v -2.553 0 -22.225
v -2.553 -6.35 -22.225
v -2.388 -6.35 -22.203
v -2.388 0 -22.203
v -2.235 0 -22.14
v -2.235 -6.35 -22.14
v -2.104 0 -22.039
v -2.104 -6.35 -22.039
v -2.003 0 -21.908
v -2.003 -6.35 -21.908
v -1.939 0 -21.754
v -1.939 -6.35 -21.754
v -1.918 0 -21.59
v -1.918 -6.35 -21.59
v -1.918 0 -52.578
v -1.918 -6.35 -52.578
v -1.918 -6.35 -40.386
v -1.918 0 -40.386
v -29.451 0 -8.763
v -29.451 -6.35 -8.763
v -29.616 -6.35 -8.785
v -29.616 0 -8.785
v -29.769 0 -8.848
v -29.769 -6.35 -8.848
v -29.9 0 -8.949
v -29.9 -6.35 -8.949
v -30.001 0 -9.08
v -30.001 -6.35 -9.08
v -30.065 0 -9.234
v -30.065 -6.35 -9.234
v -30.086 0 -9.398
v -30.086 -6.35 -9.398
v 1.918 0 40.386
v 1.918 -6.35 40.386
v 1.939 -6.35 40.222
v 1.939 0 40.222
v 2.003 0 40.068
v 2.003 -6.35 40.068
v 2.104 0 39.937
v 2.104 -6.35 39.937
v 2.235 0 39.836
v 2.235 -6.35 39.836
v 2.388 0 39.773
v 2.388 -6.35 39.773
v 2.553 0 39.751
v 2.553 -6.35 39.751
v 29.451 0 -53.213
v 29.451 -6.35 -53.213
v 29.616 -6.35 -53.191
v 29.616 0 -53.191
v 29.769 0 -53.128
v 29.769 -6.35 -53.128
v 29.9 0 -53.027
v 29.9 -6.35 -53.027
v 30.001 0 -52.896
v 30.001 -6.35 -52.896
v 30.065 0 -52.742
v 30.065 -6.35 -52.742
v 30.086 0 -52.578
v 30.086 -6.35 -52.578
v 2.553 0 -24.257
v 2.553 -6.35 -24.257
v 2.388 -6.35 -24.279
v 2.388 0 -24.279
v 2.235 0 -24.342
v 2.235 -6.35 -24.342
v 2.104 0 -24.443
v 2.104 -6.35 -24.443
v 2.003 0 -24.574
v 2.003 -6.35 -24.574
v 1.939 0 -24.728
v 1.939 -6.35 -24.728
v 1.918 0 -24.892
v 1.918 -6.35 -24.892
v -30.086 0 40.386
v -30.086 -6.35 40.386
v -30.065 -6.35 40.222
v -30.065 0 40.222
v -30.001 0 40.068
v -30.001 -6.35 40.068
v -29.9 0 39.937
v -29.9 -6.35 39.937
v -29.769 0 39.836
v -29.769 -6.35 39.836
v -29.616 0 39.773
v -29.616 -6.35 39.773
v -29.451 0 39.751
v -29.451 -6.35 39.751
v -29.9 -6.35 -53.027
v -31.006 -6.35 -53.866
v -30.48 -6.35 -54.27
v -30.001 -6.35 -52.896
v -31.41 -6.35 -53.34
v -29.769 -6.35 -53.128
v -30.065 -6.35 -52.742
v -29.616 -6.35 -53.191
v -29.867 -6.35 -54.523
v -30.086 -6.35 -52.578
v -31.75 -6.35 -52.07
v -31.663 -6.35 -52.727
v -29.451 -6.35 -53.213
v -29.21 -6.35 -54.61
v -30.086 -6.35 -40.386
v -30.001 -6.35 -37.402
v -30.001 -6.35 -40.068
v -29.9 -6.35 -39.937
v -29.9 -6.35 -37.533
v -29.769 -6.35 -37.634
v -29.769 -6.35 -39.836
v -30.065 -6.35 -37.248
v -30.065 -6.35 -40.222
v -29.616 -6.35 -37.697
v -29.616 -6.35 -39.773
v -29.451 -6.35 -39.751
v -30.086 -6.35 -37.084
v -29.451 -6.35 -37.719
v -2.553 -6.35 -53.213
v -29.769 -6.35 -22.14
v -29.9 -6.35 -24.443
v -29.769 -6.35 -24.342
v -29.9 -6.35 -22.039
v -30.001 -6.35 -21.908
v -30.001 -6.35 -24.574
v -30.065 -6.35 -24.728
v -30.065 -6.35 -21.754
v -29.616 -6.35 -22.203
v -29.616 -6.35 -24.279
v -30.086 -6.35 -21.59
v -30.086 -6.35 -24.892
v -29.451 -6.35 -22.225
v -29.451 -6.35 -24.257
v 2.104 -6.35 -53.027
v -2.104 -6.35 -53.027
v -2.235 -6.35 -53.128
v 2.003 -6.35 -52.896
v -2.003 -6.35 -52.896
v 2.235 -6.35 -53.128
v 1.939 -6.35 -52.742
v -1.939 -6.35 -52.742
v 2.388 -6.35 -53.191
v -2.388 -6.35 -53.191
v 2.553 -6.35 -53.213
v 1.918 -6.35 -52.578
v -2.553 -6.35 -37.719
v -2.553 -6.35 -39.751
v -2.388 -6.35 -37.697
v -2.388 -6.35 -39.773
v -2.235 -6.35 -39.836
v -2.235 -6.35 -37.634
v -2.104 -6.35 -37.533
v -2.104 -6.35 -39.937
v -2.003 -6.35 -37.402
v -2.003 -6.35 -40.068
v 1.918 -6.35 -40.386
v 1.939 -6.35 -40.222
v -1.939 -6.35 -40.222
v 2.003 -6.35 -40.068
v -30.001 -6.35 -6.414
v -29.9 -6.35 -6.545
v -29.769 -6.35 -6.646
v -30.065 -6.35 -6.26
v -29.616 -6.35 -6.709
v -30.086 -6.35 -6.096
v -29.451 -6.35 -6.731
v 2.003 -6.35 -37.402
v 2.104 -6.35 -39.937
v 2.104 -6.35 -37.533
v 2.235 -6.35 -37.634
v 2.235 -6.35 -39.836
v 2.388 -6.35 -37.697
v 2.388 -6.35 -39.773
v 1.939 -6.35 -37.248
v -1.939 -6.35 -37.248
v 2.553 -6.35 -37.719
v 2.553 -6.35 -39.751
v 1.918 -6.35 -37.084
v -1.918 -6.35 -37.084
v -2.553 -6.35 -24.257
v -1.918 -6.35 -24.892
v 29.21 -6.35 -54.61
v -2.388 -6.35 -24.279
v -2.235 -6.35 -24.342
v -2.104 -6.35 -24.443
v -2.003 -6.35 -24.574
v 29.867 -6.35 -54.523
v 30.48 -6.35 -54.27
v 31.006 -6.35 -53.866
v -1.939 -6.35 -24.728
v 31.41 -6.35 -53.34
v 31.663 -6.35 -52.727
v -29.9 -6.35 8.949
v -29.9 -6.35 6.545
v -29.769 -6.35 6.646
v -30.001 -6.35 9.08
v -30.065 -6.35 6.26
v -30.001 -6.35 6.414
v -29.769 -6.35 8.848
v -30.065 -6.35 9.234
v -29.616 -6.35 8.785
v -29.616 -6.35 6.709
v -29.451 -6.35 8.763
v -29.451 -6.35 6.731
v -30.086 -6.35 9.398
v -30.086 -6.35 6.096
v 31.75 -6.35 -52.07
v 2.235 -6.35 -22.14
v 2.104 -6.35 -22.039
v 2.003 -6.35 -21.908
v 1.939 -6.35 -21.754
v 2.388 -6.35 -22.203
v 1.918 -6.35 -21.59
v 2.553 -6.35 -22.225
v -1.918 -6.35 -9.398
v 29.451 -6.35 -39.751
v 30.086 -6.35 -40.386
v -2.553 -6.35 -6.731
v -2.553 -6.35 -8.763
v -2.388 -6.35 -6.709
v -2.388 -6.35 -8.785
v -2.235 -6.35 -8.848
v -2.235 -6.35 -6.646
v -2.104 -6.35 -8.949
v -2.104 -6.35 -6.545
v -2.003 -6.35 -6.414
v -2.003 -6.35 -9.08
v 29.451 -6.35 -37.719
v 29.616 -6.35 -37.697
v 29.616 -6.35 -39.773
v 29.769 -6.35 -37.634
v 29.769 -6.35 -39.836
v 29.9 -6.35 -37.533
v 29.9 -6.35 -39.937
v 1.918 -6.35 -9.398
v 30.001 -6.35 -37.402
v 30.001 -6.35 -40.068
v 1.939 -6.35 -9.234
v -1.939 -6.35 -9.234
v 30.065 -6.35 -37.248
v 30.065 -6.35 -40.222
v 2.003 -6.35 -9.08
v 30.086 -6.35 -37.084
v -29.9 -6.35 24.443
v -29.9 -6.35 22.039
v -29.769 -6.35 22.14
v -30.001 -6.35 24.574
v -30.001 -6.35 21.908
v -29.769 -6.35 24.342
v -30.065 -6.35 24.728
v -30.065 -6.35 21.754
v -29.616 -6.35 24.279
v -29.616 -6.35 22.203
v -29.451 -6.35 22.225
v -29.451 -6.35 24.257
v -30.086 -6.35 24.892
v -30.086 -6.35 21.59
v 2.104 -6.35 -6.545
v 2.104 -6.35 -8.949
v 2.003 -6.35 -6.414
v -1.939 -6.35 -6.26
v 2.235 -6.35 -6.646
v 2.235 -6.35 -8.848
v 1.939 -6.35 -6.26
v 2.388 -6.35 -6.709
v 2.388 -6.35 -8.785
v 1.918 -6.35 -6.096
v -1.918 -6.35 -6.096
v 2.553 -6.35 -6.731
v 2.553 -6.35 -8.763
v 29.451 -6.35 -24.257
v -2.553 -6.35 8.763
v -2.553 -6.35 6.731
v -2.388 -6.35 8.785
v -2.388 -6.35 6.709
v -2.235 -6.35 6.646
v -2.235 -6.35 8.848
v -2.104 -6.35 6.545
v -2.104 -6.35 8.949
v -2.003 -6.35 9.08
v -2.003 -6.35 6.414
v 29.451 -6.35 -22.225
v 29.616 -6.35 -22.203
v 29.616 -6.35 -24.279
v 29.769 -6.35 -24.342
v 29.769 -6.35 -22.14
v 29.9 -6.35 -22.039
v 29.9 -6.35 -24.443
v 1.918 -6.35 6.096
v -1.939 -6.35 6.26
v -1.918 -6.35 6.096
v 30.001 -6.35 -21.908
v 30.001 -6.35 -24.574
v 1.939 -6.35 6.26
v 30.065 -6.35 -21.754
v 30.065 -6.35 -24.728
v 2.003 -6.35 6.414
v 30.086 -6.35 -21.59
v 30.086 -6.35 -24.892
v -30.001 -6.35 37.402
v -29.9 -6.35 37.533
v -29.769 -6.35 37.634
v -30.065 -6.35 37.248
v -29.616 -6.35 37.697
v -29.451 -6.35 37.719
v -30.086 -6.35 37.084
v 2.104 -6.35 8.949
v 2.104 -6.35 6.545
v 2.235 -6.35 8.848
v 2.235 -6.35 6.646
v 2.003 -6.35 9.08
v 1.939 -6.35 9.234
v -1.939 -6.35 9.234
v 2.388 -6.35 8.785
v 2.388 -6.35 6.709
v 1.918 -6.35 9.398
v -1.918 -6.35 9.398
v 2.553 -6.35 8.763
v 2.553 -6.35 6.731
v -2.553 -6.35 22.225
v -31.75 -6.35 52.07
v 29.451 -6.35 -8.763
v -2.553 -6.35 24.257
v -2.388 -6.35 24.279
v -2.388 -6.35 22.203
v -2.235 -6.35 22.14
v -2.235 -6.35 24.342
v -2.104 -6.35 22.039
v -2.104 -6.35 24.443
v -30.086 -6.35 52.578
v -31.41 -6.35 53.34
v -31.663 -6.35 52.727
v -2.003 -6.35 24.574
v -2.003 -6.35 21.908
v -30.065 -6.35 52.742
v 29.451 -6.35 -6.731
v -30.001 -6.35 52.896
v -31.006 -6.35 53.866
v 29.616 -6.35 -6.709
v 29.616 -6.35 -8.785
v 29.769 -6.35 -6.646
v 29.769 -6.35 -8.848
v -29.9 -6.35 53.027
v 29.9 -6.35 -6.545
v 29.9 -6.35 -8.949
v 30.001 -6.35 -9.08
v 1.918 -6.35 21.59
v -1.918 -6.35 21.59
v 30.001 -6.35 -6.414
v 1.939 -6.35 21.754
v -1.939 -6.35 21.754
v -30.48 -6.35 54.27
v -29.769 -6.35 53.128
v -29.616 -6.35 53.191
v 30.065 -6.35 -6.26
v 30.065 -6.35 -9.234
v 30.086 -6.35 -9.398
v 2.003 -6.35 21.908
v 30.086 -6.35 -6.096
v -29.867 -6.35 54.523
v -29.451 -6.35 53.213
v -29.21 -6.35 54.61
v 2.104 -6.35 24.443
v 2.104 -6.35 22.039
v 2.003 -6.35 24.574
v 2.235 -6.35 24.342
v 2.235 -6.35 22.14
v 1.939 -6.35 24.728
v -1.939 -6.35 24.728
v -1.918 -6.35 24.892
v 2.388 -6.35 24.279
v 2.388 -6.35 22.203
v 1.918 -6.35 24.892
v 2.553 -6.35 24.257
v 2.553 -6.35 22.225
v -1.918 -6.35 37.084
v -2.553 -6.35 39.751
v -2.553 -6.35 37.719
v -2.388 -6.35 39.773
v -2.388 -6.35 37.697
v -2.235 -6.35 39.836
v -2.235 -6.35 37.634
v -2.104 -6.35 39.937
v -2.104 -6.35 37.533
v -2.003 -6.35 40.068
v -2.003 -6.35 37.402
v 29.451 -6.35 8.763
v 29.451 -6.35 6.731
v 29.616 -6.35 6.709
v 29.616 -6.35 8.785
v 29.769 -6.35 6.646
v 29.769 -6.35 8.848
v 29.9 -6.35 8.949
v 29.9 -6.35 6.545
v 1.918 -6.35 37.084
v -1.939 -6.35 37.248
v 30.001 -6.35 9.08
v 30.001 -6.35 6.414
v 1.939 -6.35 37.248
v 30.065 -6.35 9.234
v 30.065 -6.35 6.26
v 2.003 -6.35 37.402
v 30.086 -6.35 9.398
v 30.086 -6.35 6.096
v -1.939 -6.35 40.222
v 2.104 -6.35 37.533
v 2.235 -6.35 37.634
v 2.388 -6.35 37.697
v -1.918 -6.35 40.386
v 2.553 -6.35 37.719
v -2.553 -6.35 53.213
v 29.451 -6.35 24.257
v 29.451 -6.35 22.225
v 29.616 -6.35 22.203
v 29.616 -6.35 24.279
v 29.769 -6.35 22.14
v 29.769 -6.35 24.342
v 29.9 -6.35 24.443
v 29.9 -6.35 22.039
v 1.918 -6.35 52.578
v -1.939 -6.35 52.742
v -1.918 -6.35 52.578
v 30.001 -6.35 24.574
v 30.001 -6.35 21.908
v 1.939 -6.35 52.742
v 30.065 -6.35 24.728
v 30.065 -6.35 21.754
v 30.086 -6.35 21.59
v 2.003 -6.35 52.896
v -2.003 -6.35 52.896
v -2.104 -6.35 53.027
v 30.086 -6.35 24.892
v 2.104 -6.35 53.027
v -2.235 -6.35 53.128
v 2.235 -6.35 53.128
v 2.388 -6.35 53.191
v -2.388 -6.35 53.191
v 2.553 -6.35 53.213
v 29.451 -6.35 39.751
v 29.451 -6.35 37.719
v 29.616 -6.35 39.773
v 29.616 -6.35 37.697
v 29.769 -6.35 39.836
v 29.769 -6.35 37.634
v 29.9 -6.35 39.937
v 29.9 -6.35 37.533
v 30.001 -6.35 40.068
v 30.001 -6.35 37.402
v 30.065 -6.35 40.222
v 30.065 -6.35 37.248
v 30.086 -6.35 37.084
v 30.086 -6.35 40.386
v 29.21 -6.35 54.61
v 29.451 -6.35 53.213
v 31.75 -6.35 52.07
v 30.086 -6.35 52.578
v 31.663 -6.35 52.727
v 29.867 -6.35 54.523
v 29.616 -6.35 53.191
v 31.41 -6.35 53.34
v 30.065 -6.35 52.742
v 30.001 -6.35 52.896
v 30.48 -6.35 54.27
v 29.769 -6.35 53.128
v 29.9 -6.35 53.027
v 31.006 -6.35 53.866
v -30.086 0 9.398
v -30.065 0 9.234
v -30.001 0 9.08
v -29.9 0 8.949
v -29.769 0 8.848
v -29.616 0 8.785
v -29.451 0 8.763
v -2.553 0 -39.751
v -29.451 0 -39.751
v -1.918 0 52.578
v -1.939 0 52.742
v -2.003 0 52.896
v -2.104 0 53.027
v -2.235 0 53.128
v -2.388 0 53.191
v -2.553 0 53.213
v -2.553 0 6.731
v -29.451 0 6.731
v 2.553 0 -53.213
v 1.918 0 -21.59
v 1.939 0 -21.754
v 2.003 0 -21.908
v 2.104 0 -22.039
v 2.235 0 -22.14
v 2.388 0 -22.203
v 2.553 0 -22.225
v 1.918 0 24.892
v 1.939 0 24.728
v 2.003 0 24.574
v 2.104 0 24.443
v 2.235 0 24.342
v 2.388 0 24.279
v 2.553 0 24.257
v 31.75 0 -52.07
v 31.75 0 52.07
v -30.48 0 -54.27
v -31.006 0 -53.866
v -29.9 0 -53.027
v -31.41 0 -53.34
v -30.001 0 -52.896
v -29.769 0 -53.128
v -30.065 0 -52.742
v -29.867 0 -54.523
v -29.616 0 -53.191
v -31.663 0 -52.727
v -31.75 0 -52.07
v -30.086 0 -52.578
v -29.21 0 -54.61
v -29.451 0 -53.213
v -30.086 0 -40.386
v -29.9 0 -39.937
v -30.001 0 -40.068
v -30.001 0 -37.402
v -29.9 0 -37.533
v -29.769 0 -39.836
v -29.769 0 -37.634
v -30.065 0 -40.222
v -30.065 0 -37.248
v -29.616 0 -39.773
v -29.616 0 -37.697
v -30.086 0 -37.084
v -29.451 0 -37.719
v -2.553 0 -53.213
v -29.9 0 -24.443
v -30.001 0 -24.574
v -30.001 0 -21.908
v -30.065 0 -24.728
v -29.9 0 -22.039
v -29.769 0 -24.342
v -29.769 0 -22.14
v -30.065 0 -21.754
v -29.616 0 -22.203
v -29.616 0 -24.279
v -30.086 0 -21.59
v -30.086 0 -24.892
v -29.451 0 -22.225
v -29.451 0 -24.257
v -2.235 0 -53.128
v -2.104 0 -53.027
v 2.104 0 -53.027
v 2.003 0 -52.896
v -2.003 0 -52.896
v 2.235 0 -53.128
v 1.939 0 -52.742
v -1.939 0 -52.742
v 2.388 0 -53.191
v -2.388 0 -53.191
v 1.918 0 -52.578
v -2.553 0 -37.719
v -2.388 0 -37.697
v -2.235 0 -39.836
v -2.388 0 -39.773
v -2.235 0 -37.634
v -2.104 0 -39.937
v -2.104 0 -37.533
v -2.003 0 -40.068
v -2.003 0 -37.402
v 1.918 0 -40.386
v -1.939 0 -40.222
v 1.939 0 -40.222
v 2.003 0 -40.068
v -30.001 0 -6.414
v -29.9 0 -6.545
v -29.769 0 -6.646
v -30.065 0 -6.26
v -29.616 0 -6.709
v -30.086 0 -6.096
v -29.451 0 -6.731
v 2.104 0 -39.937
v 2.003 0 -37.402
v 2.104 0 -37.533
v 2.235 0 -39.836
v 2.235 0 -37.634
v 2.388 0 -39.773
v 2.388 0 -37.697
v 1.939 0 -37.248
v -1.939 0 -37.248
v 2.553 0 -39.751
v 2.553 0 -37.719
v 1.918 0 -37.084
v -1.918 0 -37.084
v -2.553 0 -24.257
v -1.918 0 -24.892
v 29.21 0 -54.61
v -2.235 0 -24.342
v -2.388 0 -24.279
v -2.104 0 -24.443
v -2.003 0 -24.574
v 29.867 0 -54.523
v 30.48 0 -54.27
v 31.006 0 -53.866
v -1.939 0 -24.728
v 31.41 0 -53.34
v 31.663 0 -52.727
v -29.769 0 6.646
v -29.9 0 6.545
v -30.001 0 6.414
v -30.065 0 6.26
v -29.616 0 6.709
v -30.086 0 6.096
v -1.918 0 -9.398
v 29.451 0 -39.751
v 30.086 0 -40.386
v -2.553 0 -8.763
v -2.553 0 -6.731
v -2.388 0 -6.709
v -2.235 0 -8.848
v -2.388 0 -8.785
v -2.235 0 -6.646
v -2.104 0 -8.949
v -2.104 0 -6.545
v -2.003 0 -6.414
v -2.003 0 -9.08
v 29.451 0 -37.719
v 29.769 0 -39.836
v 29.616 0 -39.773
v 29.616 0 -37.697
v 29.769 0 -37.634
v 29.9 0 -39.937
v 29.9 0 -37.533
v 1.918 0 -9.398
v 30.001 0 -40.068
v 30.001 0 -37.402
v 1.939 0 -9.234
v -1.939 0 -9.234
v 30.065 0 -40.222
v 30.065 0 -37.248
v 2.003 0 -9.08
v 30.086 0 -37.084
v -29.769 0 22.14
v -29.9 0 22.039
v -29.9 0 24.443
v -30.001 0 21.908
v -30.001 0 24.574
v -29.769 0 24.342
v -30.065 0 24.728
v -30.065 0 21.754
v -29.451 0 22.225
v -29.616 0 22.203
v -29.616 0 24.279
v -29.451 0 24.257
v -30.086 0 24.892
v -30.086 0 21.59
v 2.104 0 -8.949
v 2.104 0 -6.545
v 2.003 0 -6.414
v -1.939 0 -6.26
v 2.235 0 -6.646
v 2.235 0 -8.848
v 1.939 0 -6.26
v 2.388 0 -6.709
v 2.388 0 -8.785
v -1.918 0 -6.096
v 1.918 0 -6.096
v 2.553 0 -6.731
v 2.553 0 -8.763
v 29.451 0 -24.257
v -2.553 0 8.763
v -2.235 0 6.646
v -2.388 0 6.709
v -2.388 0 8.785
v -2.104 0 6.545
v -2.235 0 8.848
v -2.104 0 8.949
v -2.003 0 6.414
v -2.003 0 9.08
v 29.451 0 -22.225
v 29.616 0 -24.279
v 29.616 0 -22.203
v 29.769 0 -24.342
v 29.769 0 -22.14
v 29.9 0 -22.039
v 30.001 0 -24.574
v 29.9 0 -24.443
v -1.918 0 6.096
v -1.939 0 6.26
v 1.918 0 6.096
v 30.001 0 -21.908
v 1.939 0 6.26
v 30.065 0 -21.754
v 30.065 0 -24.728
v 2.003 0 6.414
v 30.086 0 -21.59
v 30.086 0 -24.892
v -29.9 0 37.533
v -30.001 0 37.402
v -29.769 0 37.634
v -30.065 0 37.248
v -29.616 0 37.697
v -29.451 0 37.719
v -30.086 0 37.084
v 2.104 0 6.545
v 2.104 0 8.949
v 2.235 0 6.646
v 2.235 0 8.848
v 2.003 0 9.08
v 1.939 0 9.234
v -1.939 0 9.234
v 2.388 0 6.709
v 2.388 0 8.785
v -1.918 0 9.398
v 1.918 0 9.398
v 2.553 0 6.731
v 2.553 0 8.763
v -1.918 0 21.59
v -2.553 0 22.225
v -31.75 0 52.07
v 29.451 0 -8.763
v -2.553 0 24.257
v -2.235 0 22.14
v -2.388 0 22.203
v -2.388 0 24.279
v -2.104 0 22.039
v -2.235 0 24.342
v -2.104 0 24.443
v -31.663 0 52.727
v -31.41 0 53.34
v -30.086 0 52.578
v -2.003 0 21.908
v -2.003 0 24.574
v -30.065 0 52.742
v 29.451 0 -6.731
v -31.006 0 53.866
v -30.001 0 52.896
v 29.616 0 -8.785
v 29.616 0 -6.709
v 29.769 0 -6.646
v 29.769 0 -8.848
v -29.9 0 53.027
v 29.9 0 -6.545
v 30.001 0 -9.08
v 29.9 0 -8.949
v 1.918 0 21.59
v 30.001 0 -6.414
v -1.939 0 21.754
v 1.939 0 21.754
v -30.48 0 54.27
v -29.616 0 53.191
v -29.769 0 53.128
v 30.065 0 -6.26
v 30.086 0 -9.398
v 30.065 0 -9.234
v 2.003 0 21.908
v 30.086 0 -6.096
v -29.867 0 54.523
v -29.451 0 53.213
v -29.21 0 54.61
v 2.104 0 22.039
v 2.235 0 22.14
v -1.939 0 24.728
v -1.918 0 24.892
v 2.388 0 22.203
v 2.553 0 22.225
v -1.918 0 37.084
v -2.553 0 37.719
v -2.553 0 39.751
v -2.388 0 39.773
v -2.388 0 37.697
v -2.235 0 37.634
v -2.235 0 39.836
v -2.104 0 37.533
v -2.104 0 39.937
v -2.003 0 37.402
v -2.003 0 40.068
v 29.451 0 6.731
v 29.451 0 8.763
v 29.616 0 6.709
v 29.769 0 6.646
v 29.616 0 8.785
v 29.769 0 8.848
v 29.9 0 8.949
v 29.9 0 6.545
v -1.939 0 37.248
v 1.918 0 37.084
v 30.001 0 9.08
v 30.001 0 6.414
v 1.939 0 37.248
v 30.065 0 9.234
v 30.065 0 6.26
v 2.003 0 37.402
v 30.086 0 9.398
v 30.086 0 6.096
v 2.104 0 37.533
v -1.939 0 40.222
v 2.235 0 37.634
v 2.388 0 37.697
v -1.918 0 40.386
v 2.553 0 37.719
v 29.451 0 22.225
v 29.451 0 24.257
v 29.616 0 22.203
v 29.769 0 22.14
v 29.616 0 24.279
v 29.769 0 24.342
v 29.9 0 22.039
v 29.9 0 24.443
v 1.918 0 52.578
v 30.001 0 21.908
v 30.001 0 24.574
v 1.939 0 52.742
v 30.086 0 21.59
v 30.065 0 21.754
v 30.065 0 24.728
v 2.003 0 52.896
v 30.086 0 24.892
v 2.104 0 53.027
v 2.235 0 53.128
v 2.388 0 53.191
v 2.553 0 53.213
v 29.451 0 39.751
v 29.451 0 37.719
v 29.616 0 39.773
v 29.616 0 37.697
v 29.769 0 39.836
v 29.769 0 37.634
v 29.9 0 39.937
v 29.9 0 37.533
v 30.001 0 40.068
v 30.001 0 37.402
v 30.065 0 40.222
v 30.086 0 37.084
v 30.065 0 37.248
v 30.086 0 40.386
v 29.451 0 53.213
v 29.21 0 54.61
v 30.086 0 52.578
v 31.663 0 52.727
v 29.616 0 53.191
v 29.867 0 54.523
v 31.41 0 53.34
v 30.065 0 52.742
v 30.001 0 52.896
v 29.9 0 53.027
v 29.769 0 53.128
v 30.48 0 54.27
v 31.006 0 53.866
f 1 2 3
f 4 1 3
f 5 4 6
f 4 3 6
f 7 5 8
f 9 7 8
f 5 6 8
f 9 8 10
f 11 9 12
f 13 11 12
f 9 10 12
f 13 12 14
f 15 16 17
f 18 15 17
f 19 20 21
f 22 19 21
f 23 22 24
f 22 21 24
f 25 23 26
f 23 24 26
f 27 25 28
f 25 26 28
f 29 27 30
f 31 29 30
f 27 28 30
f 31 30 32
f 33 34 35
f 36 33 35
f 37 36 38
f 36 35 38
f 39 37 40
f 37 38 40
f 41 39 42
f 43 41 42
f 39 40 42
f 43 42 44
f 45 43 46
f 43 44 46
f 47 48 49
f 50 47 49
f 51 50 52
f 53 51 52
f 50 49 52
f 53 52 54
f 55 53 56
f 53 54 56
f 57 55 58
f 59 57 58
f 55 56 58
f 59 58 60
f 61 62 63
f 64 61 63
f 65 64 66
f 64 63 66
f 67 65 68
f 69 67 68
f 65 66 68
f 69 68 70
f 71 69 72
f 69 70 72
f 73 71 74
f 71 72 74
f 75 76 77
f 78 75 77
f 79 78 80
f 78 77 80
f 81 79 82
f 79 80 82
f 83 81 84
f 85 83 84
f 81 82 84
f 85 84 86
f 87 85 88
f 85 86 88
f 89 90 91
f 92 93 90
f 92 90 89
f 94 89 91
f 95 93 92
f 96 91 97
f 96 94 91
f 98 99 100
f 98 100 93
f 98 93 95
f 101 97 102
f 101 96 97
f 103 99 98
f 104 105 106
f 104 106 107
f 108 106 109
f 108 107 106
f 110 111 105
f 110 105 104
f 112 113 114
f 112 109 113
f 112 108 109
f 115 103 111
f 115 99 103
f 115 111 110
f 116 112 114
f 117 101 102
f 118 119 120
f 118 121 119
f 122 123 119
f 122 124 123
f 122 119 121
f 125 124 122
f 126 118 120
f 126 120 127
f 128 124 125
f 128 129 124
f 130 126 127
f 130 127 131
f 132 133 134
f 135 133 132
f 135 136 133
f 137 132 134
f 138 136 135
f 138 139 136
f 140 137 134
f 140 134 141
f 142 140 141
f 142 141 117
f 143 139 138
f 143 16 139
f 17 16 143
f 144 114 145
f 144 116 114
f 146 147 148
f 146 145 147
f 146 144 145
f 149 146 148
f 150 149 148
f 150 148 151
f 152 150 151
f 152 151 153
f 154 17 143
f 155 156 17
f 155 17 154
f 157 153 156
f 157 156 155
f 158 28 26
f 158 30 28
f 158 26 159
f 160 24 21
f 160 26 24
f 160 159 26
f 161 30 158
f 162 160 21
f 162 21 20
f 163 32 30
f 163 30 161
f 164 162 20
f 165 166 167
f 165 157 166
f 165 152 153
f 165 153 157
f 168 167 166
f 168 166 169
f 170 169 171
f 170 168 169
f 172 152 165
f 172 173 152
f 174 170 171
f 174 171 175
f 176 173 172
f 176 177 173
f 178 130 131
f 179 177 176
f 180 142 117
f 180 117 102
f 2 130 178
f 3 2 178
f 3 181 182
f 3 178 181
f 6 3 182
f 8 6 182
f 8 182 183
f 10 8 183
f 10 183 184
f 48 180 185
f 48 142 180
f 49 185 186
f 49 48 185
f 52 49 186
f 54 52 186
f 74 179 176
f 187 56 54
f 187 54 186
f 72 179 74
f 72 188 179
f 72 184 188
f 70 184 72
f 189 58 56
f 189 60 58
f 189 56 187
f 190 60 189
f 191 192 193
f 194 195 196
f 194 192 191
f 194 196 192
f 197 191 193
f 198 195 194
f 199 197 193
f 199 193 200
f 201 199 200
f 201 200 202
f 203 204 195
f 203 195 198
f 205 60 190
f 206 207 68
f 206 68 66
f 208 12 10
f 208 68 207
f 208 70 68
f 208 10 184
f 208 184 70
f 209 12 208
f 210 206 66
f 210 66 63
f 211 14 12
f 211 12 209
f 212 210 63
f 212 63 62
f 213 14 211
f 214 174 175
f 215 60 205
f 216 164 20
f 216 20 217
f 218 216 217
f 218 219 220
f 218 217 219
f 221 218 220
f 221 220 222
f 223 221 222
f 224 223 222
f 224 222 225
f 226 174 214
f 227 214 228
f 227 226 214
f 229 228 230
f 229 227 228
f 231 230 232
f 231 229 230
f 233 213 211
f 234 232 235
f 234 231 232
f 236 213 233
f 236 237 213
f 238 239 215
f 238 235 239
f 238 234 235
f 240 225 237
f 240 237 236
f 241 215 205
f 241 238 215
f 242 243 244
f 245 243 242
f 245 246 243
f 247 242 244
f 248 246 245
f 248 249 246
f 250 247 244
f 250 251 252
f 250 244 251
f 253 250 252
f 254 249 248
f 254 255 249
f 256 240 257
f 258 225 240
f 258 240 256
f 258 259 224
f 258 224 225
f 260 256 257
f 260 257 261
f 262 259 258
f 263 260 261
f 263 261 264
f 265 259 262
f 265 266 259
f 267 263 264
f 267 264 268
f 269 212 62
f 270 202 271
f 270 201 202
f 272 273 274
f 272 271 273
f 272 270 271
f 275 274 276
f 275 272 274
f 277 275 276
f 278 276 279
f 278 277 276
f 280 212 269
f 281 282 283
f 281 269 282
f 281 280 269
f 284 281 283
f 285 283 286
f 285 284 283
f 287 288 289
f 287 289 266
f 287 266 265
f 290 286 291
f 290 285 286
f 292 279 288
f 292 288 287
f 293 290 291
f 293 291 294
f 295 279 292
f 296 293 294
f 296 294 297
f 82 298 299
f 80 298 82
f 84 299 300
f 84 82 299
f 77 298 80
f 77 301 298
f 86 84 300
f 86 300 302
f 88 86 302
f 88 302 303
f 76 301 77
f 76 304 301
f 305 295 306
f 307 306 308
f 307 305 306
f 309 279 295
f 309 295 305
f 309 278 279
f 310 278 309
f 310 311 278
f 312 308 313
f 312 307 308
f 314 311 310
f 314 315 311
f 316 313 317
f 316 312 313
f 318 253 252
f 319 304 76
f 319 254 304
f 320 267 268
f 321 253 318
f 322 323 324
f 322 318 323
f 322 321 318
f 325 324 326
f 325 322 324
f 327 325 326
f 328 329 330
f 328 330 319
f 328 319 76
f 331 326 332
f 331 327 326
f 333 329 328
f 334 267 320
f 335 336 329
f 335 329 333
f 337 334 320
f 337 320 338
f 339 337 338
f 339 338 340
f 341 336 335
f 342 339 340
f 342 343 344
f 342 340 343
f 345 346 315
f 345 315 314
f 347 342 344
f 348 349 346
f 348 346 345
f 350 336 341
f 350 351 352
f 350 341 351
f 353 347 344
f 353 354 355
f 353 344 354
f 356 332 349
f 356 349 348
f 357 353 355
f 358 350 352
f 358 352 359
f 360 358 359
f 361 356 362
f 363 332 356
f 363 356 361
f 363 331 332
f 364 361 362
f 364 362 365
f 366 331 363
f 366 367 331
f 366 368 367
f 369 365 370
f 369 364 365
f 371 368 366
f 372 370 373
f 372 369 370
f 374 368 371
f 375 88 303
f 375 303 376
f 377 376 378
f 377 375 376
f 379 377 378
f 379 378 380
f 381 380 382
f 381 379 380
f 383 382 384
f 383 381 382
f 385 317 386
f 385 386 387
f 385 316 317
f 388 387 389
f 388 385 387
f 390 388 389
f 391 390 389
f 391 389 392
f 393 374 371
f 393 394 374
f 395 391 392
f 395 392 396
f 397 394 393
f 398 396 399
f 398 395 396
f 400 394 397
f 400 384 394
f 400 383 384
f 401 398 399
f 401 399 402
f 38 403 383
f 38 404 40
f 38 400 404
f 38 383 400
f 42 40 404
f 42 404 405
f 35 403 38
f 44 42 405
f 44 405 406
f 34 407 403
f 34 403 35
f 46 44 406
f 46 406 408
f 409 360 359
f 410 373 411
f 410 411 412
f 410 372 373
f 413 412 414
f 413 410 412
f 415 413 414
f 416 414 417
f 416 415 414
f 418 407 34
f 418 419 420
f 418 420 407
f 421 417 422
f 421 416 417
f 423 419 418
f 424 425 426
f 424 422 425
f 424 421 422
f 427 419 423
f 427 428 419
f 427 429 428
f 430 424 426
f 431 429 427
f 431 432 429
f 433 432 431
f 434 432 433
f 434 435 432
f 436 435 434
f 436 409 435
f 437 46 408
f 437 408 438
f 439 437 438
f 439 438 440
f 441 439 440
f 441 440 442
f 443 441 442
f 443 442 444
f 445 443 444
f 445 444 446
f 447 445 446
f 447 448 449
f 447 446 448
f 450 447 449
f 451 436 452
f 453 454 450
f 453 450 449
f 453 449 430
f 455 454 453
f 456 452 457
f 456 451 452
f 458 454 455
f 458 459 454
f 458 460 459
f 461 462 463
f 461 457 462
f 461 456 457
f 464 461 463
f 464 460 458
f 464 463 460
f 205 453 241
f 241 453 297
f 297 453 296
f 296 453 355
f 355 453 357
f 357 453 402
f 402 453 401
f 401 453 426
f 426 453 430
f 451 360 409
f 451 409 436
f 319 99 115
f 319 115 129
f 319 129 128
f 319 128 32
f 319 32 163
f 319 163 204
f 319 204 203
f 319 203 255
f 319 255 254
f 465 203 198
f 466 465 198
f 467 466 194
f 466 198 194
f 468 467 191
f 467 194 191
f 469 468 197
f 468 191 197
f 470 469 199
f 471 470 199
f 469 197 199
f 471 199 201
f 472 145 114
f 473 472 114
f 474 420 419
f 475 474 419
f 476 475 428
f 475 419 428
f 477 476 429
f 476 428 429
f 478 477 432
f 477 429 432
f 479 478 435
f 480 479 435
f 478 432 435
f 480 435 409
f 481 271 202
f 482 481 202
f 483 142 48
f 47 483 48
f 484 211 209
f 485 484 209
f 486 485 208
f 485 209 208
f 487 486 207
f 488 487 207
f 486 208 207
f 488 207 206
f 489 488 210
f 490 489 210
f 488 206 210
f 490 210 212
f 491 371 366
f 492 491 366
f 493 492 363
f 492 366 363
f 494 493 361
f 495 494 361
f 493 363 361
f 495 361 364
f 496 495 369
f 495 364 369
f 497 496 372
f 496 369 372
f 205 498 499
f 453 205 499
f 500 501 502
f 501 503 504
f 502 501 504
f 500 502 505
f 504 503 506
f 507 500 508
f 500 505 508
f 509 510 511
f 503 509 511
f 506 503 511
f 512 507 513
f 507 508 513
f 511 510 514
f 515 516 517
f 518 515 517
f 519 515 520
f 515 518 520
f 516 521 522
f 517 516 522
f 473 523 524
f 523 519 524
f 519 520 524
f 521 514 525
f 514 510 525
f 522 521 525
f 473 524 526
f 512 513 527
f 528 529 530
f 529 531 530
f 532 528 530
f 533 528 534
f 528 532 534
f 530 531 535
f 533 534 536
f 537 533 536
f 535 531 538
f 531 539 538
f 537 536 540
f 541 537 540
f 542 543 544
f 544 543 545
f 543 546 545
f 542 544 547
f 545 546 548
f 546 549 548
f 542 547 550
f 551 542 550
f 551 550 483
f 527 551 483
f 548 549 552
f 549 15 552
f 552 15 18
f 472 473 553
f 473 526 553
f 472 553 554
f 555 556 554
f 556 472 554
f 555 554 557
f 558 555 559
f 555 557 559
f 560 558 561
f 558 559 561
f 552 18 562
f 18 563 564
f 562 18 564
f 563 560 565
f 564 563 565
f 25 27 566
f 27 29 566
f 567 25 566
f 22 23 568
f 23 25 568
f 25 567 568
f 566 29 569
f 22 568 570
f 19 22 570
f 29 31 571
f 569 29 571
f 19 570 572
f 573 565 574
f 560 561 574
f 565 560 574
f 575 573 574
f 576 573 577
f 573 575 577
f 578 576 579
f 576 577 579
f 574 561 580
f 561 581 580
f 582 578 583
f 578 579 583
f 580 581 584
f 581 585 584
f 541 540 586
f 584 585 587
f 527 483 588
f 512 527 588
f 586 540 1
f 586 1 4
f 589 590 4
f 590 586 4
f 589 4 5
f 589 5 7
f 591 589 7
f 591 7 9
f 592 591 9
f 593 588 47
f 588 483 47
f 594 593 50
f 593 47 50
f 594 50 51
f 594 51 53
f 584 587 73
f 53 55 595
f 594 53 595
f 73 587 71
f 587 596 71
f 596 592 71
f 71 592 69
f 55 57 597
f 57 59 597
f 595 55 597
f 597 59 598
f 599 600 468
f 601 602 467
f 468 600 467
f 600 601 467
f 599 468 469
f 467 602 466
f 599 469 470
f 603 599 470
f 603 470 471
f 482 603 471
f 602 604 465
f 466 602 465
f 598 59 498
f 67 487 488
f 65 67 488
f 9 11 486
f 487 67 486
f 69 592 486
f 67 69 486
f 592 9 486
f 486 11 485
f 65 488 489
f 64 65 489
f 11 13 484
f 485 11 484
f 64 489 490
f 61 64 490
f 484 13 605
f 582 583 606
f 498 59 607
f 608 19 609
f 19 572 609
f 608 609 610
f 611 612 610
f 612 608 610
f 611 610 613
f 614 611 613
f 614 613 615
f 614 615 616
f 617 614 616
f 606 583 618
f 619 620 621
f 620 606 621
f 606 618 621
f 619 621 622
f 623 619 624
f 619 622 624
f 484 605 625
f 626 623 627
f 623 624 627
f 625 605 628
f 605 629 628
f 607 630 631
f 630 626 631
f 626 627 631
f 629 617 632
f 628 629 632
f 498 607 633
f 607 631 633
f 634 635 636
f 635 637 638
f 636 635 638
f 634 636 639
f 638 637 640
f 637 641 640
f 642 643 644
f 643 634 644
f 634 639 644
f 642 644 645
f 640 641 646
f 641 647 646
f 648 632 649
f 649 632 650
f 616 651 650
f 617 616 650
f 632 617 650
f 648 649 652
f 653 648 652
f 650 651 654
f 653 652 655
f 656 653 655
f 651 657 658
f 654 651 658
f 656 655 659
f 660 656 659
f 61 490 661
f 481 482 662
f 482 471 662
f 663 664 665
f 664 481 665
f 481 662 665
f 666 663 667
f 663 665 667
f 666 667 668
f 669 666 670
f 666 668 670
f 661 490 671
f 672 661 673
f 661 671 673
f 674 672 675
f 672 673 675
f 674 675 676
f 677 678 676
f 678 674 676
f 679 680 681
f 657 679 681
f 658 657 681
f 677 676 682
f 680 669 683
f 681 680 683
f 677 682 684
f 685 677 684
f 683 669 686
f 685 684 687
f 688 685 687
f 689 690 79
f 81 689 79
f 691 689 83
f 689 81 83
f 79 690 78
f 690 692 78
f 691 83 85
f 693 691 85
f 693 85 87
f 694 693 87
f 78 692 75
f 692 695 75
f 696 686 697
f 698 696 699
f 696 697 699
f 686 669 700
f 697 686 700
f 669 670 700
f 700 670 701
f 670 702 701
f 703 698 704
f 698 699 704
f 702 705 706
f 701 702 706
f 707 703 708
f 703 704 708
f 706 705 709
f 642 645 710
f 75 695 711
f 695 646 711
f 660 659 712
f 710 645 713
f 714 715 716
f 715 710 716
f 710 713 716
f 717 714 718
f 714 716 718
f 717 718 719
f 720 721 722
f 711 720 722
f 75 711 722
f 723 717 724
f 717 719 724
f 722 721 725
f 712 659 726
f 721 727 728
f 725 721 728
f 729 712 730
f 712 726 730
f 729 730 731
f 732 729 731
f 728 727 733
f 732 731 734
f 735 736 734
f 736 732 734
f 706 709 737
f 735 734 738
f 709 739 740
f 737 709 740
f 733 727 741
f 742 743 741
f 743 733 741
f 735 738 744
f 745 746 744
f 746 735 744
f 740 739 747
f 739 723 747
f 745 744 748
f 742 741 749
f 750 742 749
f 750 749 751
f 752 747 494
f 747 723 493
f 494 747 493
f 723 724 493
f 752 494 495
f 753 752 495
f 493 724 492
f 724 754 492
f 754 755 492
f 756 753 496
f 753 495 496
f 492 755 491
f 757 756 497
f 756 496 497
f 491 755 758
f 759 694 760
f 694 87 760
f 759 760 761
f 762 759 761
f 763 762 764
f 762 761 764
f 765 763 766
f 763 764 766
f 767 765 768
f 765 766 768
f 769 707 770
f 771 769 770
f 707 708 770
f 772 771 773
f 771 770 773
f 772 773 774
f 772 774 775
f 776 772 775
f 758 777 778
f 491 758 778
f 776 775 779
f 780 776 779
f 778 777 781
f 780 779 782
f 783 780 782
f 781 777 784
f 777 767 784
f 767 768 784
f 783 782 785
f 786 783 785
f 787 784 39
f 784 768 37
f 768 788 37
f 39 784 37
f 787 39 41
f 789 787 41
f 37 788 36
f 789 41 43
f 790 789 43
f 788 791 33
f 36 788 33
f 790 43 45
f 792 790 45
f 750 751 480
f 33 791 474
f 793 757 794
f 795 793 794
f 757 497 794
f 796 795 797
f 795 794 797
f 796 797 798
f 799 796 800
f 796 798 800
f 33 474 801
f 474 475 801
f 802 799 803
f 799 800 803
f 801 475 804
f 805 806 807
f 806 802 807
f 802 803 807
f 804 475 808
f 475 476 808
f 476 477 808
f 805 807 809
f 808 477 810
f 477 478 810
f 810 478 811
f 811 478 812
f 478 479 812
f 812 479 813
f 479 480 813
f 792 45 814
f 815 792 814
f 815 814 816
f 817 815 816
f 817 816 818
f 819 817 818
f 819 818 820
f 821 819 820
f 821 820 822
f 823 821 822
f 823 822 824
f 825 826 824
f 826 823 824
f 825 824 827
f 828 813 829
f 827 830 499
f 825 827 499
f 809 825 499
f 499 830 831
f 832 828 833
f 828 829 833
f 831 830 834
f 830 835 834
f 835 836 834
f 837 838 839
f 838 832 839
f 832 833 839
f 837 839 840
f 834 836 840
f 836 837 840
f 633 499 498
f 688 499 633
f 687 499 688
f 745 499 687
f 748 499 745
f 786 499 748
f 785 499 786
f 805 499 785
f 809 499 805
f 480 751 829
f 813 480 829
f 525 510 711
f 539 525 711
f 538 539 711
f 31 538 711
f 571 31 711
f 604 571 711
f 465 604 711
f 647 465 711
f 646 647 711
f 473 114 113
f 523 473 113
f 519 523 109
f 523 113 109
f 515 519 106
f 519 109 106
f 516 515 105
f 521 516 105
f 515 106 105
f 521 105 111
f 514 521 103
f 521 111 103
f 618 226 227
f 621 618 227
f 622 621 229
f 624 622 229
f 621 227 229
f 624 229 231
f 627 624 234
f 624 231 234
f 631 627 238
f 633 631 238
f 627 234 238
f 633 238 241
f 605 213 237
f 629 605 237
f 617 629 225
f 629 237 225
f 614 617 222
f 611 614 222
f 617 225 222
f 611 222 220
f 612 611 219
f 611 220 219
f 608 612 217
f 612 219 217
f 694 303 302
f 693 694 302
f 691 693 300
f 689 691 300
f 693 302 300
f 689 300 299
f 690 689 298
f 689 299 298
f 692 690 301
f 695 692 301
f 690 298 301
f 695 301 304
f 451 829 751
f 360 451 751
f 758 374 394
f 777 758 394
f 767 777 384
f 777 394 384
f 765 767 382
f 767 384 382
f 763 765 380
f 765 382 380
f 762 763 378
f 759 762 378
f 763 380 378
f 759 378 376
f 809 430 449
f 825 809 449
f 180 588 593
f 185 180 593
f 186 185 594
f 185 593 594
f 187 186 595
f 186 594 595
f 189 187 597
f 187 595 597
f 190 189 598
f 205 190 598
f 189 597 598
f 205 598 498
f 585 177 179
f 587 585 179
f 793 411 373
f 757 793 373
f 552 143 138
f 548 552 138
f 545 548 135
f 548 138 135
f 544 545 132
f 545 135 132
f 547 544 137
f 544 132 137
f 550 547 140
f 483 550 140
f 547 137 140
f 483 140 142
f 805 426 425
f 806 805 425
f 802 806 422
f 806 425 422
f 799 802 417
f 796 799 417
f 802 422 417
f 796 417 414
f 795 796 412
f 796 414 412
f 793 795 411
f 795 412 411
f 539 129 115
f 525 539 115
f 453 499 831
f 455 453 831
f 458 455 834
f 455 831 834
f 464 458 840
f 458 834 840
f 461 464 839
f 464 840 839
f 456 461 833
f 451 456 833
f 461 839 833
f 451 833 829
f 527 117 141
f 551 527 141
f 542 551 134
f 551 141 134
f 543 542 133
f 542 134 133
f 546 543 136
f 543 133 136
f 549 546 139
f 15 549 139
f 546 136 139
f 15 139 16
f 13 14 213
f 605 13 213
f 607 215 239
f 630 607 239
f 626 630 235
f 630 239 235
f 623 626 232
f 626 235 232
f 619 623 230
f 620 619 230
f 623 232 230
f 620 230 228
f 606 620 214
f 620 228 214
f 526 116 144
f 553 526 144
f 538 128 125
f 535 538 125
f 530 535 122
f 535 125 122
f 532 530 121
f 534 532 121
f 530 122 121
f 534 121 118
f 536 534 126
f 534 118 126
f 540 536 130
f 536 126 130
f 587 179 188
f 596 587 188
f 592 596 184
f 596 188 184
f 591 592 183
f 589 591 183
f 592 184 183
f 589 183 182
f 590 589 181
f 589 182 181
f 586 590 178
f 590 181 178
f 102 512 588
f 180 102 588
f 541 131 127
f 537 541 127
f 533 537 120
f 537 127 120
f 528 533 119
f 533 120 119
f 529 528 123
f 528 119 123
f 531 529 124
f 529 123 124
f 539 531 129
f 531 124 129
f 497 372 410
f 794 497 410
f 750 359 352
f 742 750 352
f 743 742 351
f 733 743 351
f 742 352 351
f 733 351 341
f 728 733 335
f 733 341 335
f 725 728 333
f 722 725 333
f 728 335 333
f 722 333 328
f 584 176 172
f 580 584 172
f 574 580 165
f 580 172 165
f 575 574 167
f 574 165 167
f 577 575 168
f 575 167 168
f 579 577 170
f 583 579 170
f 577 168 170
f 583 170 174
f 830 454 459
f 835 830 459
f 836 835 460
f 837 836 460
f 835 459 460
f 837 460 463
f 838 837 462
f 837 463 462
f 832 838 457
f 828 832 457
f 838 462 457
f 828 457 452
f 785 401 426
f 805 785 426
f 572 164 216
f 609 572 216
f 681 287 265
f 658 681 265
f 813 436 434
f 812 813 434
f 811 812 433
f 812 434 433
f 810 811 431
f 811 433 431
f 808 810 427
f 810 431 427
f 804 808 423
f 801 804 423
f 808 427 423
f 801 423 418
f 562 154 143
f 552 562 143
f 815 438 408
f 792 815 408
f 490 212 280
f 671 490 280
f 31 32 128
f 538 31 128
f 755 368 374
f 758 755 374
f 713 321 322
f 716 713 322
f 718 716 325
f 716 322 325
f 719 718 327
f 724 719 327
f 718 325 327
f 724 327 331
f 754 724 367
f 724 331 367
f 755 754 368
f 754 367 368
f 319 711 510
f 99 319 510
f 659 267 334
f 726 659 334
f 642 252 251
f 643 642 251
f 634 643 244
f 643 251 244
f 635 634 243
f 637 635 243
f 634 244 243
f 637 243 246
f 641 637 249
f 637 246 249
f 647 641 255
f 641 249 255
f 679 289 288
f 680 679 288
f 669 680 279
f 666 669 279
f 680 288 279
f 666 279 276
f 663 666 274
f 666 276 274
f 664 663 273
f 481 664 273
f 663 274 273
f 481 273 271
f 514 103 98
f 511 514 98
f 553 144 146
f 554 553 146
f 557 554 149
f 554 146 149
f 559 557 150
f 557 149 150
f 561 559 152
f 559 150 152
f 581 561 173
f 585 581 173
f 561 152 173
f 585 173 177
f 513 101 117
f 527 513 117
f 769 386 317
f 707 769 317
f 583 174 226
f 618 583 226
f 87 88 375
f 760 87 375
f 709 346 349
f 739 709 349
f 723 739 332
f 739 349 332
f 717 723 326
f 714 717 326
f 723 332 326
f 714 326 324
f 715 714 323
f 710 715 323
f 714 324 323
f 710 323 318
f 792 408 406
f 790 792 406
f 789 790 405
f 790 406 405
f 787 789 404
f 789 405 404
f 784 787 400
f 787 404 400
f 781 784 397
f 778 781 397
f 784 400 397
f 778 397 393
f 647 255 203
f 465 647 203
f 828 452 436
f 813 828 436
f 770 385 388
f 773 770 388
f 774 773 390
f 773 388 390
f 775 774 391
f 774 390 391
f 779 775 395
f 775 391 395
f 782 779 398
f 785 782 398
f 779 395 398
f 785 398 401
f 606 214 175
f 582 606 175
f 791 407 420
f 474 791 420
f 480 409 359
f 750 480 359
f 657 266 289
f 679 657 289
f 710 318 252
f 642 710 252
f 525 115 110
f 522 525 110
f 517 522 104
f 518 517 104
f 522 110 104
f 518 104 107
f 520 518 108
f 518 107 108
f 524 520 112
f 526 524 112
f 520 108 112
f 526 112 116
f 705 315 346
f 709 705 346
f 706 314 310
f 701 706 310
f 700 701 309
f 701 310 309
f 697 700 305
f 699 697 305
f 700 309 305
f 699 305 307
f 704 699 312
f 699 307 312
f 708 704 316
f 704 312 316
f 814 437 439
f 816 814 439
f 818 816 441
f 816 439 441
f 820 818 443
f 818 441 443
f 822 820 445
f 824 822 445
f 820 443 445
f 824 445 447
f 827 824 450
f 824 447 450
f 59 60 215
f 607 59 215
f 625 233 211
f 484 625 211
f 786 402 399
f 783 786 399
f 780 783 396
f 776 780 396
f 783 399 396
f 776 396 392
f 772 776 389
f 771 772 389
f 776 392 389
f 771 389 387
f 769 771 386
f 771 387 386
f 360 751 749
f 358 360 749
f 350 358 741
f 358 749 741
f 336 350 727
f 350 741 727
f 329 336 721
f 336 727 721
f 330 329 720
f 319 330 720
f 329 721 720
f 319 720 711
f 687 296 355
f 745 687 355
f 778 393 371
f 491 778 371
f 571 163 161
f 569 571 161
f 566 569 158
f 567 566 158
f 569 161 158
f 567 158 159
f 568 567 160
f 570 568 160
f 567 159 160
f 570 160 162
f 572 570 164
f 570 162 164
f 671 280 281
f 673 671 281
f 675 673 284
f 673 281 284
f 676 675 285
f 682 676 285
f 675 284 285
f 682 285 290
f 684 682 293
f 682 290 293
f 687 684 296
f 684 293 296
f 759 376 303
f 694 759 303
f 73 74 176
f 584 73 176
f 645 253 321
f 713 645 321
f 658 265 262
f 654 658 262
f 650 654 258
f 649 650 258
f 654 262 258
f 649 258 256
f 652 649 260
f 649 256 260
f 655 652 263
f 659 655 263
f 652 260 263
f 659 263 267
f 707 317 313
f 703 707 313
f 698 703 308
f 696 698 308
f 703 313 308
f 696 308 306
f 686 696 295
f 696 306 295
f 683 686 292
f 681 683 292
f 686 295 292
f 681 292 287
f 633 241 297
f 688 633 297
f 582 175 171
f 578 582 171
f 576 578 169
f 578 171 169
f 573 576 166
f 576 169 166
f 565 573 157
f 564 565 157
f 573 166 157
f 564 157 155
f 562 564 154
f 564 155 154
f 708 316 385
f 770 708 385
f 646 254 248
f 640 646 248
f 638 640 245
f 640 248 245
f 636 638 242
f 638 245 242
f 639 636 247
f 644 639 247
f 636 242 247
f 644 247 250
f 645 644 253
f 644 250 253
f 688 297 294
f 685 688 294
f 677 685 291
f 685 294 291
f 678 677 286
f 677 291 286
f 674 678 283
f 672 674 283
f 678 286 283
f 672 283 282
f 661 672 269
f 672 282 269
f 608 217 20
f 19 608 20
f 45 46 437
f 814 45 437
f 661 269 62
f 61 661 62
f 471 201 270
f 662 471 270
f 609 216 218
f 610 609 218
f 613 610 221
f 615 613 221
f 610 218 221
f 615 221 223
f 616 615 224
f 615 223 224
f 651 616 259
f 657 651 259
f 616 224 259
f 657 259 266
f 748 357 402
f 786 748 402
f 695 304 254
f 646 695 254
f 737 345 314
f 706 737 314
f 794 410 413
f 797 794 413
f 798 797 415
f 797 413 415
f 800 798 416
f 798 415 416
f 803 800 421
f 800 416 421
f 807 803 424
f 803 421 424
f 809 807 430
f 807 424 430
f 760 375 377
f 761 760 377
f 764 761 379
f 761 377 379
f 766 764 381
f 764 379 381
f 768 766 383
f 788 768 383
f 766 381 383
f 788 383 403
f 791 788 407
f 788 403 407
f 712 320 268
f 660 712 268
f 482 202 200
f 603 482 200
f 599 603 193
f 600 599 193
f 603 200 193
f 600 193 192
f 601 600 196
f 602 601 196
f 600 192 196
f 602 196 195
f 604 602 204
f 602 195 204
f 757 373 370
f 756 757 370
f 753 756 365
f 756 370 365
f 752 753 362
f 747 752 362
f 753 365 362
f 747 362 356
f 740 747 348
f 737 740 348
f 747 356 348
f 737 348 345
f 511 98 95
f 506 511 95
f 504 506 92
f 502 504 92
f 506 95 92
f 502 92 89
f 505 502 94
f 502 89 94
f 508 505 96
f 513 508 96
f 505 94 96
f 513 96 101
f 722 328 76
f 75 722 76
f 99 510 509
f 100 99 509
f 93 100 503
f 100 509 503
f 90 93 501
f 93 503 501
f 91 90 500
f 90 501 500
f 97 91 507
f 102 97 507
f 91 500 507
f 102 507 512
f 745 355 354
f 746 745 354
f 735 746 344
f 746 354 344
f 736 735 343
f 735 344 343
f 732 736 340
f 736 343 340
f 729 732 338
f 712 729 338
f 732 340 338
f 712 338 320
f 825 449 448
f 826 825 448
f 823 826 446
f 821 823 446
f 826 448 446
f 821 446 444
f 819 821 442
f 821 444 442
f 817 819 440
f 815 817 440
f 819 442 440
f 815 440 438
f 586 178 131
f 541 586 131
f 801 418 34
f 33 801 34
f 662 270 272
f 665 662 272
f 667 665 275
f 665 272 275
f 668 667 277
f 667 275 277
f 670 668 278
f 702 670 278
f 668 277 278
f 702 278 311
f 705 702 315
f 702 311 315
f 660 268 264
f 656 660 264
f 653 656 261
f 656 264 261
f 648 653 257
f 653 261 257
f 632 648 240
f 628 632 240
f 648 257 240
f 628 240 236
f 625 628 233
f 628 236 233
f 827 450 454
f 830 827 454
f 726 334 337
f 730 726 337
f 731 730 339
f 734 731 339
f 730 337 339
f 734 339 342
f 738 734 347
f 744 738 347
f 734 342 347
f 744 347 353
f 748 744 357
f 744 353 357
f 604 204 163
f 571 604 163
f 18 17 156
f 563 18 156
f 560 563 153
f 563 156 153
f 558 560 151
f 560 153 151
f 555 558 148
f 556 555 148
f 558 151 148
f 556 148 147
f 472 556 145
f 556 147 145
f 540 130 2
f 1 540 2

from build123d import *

# Parameters (mm, degrees)
F1_DEPTH = 6.35
F3_DEPTH = 6.351


with BuildPart() as f1:
    # F0 (on Front) → F1 (new body)
    with BuildSketch(Plane.XZ):
        with BuildLine():
            ThreePointArc((-31.75, -52.07), (-31.006051, -53.866051), (-29.21, -54.61))
            Line((-29.21, -54.61), (29.21, -54.61))
            ThreePointArc((29.21, -54.61), (31.006051, -53.866051), (31.75, -52.07))
            Line((31.75, -52.07), (31.75, 52.07))
            ThreePointArc((31.75, 52.07), (31.006051, 53.866051), (29.21, 54.61))
            Line((29.21, 54.61), (-29.21, 54.61))
            ThreePointArc((-29.21, 54.61), (-31.006051, 53.866051), (-31.75, 52.07))
            Line((-31.75, 52.07), (-31.75, -52.07))
        make_face()
    extrude(amount=F1_DEPTH)

    # F2 (on face) → F3 (cut, through all)
    with BuildSketch(Plane.XZ.offset(6.35)):
        with BuildLine():
            Line((-29.4513, 39.751), (-2.5527, 39.751))
            ThreePointArc((-2.5527, 39.751), (-2.103687, 39.936987), (-1.9177, 40.386))
            Line((-1.9177, 40.386), (-1.9177, 52.578))
            ThreePointArc((-1.9177, 52.578), (-2.103687, 53.027013), (-2.5527, 53.213))
            Line((-2.5527, 53.213), (-29.4513, 53.213))
            ThreePointArc((-29.4513, 53.213), (-29.900313, 53.027013), (-30.0863, 52.578))
            Line((-30.0863, 52.578), (-30.0863, 40.386))
            ThreePointArc((-30.0863, 40.386), (-29.900313, 39.936987), (-29.4513, 39.751))
        make_face()
        with BuildLine():
            Line((-30.0863, 37.084), (-30.0863, 24.892))
            ThreePointArc((-30.0863, 24.892), (-29.900313, 24.442987), (-29.4513, 24.257))
            Line((-29.4513, 24.257), (-2.5527, 24.257))
            ThreePointArc((-2.5527, 24.257), (-2.103687, 24.442987), (-1.9177, 24.892))
            Line((-1.9177, 24.892), (-1.9177, 37.084))
            ThreePointArc((-1.9177, 37.084), (-2.103687, 37.533013), (-2.5527, 37.719))
            Line((-2.5527, 37.719), (-29.4513, 37.719))
            ThreePointArc((-29.4513, 37.719), (-29.900313, 37.533013), (-30.0863, 37.084))
        make_face()
        with BuildLine():
            Line((-30.0863, 21.59), (-30.0863, 9.398))
            ThreePointArc((-30.0863, 9.398), (-29.900313, 8.948987), (-29.4513, 8.763))
            Line((-29.4513, 8.763), (-2.5527, 8.763))
            ThreePointArc((-2.5527, 8.763), (-2.103687, 8.948987), (-1.9177, 9.398))
            Line((-1.9177, 9.398), (-1.9177, 21.59))
            ThreePointArc((-1.9177, 21.59), (-2.103687, 22.039013), (-2.5527, 22.225))
            Line((-2.5527, 22.225), (-29.4513, 22.225))
            ThreePointArc((-29.4513, 22.225), (-29.900313, 22.039013), (-30.0863, 21.59))
        make_face()
        with BuildLine():
            Line((-30.0863, 6.096), (-30.0863, -6.096))
            ThreePointArc((-30.0863, -6.096), (-29.900313, -6.545013), (-29.4513, -6.731))
            Line((-29.4513, -6.731), (-2.5527, -6.731))
            ThreePointArc((-2.5527, -6.731), (-2.103687, -6.545013), (-1.9177, -6.096))
            Line((-1.9177, -6.096), (-1.9177, 6.096))
            ThreePointArc((-1.9177, 6.096), (-2.103687, 6.545013), (-2.5527, 6.731))
            Line((-2.5527, 6.731), (-29.4513, 6.731))
            ThreePointArc((-29.4513, 6.731), (-29.900313, 6.545013), (-30.0863, 6.096))
        make_face()
        with BuildLine():
            Line((-30.0863, -9.398), (-30.0863, -21.59))
            ThreePointArc((-30.0863, -21.59), (-29.900313, -22.039013), (-29.4513, -22.225))
            Line((-29.4513, -22.225), (-2.5527, -22.225))
            ThreePointArc((-2.5527, -22.225), (-2.103687, -22.039013), (-1.9177, -21.59))
            Line((-1.9177, -21.59), (-1.9177, -9.398))
            ThreePointArc((-1.9177, -9.398), (-2.103687, -8.948987), (-2.5527, -8.763))
            Line((-2.5527, -8.763), (-29.4513, -8.763))
            ThreePointArc((-29.4513, -8.763), (-29.900313, -8.948987), (-30.0863, -9.398))
        make_face()
        with BuildLine():
            Line((-30.0863, -24.892), (-30.0863, -37.084))
            ThreePointArc((-30.0863, -37.084), (-29.900313, -37.533013), (-29.4513, -37.719))
            Line((-29.4513, -37.719), (-2.5527, -37.719))
            ThreePointArc((-2.5527, -37.719), (-2.103687, -37.533013), (-1.9177, -37.084))
            Line((-1.9177, -37.084), (-1.9177, -24.892))
            ThreePointArc((-1.9177, -24.892), (-2.103687, -24.442987), (-2.5527, -24.257))
            Line((-2.5527, -24.257), (-29.4513, -24.257))
            ThreePointArc((-29.4513, -24.257), (-29.900313, -24.442987), (-30.0863, -24.892))
        make_face()
        with BuildLine():
            Line((-30.0863, -40.386), (-30.0863, -52.578))
            ThreePointArc((-30.0863, -52.578), (-29.900313, -53.027013), (-29.4513, -53.213))
            Line((-29.4513, -53.213), (-2.5527, -53.213))
            ThreePointArc((-2.5527, -53.213), (-2.103687, -53.027013), (-1.9177, -52.578))
            Line((-1.9177, -52.578), (-1.9177, -40.386))
            ThreePointArc((-1.9177, -40.386), (-2.103687, -39.936987), (-2.5527, -39.751))
            Line((-2.5527, -39.751), (-29.4513, -39.751))
            ThreePointArc((-29.4513, -39.751), (-29.900313, -39.936987), (-30.0863, -40.386))
        make_face()
        with BuildLine():
            Line((1.9177, 52.578), (1.9177, 40.386))
            ThreePointArc((1.9177, 40.386), (2.103687, 39.936987), (2.5527, 39.751))
            Line((2.5527, 39.751), (29.4513, 39.751))
            ThreePointArc((29.4513, 39.751), (29.900313, 39.936987), (30.0863, 40.386))
            Line((30.0863, 40.386), (30.0863, 52.578))
            ThreePointArc((30.0863, 52.578), (29.900313, 53.027013), (29.4513, 53.213))
            Line((29.4513, 53.213), (2.5527, 53.213))
            ThreePointArc((2.5527, 53.213), (2.103687, 53.027013), (1.9177, 52.578))
        make_face()
        with BuildLine():
            Line((1.9177, 37.084), (1.9177, 24.892))
            ThreePointArc((1.9177, 24.892), (2.103687, 24.442987), (2.5527, 24.257))
            Line((2.5527, 24.257), (29.4513, 24.257))
            ThreePointArc((29.4513, 24.257), (29.900313, 24.442987), (30.0863, 24.892))
            Line((30.0863, 24.892), (30.0863, 37.084))
            ThreePointArc((30.0863, 37.084), (29.900313, 37.533013), (29.4513, 37.719))
            Line((29.4513, 37.719), (2.5527, 37.719))
            ThreePointArc((2.5527, 37.719), (2.103687, 37.533013), (1.9177, 37.084))
        make_face()
        with BuildLine():
            Line((1.9177, 21.59), (1.9177, 9.398))
            ThreePointArc((1.9177, 9.398), (2.103687, 8.948987), (2.5527, 8.763))
            Line((2.5527, 8.763), (29.4513, 8.763))
            ThreePointArc((29.4513, 8.763), (29.900313, 8.948987), (30.0863, 9.398))
            Line((30.0863, 9.398), (30.0863, 21.59))
            ThreePointArc((30.0863, 21.59), (29.900313, 22.039013), (29.4513, 22.225))
            Line((29.4513, 22.225), (2.5527, 22.225))
            ThreePointArc((2.5527, 22.225), (2.103687, 22.039013), (1.9177, 21.59))
        make_face()
        with BuildLine():
            Line((1.9177, 6.096), (1.9177, -6.096))
            ThreePointArc((1.9177, -6.096), (2.103687, -6.545013), (2.5527, -6.731))
            Line((2.5527, -6.731), (29.4513, -6.731))
            ThreePointArc((29.4513, -6.731), (29.900313, -6.545013), (30.0863, -6.096))
            Line((30.0863, -6.096), (30.0863, 6.096))
            ThreePointArc((30.0863, 6.096), (29.900313, 6.545013), (29.4513, 6.731))
            Line((29.4513, 6.731), (2.5527, 6.731))
            ThreePointArc((2.5527, 6.731), (2.103687, 6.545013), (1.9177, 6.096))
        make_face()
        with BuildLine():
            Line((1.9177, -9.398), (1.9177, -21.59))
            ThreePointArc((1.9177, -21.59), (2.103687, -22.039013), (2.5527, -22.225))
            Line((2.5527, -22.225), (29.4513, -22.225))
            ThreePointArc((29.4513, -22.225), (29.900313, -22.039013), (30.0863, -21.59))
            Line((30.0863, -21.59), (30.0863, -9.398))
            ThreePointArc((30.0863, -9.398), (29.900313, -8.948987), (29.4513, -8.763))
            Line((29.4513, -8.763), (2.5527, -8.763))
            ThreePointArc((2.5527, -8.763), (2.103687, -8.948987), (1.9177, -9.398))
        make_face()
        with BuildLine():
            Line((1.9177, -24.892), (1.9177, -37.084))
            ThreePointArc((1.9177, -37.084), (2.103687, -37.533013), (2.5527, -37.719))
            Line((2.5527, -37.719), (29.4513, -37.719))
            ThreePointArc((29.4513, -37.719), (29.900313, -37.533013), (30.0863, -37.084))
            Line((30.0863, -37.084), (30.0863, -24.892))
            ThreePointArc((30.0863, -24.892), (29.900313, -24.442987), (29.4513, -24.257))
            Line((29.4513, -24.257), (2.5527, -24.257))
            ThreePointArc((2.5527, -24.257), (2.103687, -24.442987), (1.9177, -24.892))
        make_face()
        with BuildLine():
            Line((1.9177, -40.386), (1.9177, -52.578))
            ThreePointArc((1.9177, -52.578), (2.103687, -53.027013), (2.5527, -53.213))
            Line((2.5527, -53.213), (29.4513, -53.213))
            ThreePointArc((29.4513, -53.213), (29.900313, -53.027013), (30.0863, -52.578))
            Line((30.0863, -52.578), (30.0863, -40.386))
            ThreePointArc((30.0863, -40.386), (29.900313, -39.936987), (29.4513, -39.751))
            Line((29.4513, -39.751), (2.5527, -39.751))
            ThreePointArc((2.5527, -39.751), (2.103687, -39.936987), (1.9177, -40.386))
        make_face()
    extrude(amount=-F3_DEPTH, mode=Mode.SUBTRACT)


solid = f1.part
